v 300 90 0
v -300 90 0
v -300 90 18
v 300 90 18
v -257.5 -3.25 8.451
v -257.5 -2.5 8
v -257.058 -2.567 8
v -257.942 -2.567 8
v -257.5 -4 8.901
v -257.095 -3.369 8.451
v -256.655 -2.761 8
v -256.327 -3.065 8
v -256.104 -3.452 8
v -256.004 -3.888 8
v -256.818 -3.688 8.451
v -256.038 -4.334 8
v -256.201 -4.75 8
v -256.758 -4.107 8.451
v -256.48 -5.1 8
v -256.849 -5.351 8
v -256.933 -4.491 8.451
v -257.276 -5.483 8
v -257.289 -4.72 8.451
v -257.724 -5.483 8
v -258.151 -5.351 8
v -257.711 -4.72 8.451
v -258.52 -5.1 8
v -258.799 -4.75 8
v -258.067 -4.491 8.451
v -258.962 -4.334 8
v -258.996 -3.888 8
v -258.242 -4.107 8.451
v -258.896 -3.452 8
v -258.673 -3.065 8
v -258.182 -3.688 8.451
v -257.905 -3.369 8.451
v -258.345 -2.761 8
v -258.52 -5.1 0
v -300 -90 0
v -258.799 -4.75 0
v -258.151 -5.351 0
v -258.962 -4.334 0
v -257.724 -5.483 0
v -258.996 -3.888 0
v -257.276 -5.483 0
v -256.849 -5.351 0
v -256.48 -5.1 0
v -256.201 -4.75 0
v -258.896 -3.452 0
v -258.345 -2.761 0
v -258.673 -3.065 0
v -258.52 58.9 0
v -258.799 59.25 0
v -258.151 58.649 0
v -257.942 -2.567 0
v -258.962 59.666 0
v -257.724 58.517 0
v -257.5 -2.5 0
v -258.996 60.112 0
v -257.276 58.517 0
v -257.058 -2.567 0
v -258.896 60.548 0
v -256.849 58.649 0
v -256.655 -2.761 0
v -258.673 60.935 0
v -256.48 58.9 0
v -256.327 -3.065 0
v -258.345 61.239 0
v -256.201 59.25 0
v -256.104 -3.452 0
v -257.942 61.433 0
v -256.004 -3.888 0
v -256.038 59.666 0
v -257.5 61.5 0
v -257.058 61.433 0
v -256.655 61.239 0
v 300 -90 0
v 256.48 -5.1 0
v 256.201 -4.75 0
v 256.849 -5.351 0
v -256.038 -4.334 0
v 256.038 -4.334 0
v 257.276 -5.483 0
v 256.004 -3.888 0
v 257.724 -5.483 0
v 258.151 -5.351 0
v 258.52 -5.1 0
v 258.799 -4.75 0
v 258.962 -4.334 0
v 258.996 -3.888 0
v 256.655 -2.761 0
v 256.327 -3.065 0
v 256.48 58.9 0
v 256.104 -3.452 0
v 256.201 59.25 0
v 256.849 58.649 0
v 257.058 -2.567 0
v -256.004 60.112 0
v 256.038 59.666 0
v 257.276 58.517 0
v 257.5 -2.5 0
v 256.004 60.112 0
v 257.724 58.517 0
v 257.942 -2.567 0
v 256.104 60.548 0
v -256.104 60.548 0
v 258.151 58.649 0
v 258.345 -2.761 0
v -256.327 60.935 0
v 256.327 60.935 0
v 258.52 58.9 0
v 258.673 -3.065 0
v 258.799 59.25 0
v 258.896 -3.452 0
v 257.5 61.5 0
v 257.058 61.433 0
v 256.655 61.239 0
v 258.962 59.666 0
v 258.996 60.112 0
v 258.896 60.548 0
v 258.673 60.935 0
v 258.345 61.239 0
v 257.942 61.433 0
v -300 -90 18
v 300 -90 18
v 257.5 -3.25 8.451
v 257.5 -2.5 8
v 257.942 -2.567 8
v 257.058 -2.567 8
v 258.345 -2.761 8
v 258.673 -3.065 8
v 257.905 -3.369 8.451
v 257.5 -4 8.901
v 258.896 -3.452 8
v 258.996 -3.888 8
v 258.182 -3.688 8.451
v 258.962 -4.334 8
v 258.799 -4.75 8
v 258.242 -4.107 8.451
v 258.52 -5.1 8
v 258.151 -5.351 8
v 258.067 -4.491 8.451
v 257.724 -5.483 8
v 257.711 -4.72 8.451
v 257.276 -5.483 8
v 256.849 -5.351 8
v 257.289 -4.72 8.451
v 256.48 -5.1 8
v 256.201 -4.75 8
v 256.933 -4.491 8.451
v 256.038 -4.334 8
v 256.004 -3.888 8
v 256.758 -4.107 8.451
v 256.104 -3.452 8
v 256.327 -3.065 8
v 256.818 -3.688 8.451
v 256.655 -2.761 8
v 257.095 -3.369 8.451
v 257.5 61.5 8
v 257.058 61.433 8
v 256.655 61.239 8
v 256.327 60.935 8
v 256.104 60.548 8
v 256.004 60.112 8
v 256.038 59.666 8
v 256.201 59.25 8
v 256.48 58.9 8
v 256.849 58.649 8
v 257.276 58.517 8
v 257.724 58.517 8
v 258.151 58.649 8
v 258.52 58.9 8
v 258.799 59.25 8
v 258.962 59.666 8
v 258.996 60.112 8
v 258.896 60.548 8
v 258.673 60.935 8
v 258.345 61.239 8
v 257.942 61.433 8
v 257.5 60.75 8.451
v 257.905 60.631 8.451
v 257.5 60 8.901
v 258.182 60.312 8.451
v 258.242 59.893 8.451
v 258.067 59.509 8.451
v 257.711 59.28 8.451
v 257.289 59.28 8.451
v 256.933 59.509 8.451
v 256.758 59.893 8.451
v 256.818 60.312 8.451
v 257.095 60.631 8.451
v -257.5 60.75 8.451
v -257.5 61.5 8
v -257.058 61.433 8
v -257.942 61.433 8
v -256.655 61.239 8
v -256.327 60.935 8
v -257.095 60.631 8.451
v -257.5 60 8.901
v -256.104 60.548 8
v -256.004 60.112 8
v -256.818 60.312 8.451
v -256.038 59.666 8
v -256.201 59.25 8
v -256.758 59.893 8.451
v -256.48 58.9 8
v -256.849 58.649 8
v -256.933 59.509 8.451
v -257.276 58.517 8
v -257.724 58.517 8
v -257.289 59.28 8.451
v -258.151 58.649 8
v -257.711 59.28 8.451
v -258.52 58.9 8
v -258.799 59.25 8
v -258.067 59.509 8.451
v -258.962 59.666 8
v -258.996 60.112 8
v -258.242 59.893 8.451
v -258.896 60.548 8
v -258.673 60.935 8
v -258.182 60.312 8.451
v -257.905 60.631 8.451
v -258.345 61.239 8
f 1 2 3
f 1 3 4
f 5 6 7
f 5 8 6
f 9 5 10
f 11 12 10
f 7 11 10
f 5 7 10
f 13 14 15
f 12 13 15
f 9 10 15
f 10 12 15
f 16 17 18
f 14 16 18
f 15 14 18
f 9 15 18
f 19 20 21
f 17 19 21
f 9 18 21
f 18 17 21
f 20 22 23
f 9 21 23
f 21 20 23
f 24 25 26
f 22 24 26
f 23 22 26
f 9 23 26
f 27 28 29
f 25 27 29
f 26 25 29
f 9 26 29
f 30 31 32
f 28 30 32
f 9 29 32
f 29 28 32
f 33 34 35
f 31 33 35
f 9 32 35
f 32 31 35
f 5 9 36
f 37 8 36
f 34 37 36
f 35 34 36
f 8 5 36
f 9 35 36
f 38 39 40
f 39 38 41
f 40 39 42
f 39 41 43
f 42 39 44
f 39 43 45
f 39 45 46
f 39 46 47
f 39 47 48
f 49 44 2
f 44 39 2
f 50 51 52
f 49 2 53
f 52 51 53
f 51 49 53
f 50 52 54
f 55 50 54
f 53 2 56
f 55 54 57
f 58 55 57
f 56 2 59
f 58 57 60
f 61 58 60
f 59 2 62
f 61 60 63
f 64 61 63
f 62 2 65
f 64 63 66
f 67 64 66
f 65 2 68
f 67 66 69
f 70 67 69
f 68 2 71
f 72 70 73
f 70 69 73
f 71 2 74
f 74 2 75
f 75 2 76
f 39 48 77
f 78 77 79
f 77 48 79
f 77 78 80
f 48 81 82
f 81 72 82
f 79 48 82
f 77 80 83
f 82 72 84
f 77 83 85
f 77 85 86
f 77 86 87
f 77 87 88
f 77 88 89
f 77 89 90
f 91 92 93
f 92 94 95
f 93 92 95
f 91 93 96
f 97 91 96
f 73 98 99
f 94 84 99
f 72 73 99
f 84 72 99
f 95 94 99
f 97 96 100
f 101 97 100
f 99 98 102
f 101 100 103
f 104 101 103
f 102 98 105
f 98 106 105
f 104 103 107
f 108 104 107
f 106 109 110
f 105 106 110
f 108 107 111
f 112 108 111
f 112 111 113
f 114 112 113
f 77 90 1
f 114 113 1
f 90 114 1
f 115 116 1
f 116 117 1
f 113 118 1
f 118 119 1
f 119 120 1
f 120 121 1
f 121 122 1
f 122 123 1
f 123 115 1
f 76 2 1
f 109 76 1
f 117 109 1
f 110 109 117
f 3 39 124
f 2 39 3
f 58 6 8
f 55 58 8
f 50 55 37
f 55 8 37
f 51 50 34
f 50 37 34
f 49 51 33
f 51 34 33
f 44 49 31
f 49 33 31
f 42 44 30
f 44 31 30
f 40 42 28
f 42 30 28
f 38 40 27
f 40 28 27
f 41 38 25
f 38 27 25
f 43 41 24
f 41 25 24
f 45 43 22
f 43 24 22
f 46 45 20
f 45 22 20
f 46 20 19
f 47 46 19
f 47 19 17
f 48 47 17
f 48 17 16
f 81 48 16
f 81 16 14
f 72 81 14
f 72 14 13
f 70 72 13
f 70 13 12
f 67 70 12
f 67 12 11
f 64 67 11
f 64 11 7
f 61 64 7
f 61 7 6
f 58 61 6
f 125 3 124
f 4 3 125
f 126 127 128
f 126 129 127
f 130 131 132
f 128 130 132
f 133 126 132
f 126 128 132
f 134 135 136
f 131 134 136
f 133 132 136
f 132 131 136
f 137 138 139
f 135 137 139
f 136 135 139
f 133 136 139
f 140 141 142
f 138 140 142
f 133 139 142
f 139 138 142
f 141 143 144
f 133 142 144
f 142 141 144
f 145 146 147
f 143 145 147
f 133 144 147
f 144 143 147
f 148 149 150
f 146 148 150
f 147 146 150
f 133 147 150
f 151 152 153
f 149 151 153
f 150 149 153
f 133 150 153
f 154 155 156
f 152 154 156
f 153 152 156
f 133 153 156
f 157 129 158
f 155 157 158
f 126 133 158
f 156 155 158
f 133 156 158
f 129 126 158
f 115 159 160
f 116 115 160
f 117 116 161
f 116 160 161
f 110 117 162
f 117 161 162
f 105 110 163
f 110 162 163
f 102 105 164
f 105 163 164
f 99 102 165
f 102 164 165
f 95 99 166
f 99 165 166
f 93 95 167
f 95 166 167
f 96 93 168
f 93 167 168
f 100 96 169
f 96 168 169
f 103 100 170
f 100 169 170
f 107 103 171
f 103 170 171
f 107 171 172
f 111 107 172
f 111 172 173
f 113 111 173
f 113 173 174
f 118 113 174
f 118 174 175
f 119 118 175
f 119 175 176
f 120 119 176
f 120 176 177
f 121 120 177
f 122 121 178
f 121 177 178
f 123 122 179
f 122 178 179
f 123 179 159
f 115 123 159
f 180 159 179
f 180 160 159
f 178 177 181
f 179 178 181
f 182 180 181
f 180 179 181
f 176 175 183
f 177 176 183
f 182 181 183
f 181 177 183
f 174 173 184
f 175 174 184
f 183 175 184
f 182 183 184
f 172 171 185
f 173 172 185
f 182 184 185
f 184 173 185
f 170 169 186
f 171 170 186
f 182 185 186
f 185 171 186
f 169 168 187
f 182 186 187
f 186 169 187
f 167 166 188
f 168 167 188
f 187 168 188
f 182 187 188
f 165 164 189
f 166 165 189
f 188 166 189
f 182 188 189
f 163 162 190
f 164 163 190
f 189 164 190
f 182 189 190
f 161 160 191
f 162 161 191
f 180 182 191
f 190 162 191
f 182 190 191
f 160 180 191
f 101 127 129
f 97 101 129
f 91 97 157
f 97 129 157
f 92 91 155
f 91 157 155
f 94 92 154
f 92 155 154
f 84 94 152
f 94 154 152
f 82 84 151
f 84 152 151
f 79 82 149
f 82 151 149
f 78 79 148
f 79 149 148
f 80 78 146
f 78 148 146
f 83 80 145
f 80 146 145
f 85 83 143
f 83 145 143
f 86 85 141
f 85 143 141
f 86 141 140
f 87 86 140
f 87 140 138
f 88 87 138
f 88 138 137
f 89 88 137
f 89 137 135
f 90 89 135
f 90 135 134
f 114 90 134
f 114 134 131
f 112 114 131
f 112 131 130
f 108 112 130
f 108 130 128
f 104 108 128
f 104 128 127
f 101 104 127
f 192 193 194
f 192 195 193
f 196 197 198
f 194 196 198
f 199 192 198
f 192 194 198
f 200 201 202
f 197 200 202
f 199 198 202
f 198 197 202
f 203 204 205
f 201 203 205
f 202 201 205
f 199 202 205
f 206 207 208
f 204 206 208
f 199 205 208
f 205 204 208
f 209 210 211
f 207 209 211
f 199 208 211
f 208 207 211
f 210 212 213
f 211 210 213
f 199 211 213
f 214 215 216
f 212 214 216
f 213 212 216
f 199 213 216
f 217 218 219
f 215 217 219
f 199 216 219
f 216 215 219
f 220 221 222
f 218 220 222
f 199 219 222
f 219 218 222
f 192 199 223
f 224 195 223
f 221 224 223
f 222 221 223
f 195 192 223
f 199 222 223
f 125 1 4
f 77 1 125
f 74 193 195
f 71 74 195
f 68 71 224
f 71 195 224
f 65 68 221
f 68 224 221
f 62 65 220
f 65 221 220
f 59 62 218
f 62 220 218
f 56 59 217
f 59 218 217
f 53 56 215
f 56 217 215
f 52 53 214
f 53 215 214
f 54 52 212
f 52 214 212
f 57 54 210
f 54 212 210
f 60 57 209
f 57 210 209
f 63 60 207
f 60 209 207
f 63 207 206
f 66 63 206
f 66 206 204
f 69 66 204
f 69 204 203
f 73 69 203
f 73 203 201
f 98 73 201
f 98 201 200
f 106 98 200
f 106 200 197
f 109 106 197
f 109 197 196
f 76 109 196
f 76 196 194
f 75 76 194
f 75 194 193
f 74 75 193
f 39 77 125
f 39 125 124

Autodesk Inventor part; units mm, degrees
ref_plane "YZ Plane" through (0, 0, 0) normal (1, 0, 0) x (0, 1, 0)
ref_plane "XZ Plane" through (0, 0, 0) normal (0, 1, 0) x (-1, 0, 0)
ref_plane "XY Plane" through (0, 0, 0) normal (0, 0, 1) x (1, 0, 0)
sketch "Szkic1" plane through (0, 0, 0) normal (0, 0, 1) x (1, 0, 0)
  line L0 (300, -90) -> (-300, -90)
  line L1 (-300, -90) -> (-300, 90)
  line L2 (-300, 90) -> (300, 90)
  line L3 (300, 90) -> (300, -90)
  line L4 (300, -90) -> (-300, 90) construction
  line L5 (-300, -90) -> (300, 90) construction
  line L6 (0, 0) -> (0, 28) construction
  line L7 (257.5, 60) -> (-257.5, 60) construction
  line L8 (-257.5, 60) -> (-257.5, -4) construction
  line L9 (-257.5, -4) -> (257.5, -4) construction
  line L10 (257.5, -4) -> (257.5, 60) construction
  line L11 (257.5, 60) -> (-257.5, -4) construction
  line L12 (-257.5, 60) -> (257.5, -4) construction
  dimension "d0" = 600
  dimension "d2" = 180
  dimension "d3" = 515
  dimension "d4" = 64
  dimension "d5" = 30
extrude "Wyciągnięcie proste1" add sketch "Szkic1" along normal blind 18
hole "Otwór1" at (-257.5, 60, 0) at (-257.5, -4, 0) at (257.5, 60, 0) at (257.5, -4, 0) direction (0, 0, 1) diameter 3 depth 8 tip angle 118
properties part number "front szuflady 150mm"
